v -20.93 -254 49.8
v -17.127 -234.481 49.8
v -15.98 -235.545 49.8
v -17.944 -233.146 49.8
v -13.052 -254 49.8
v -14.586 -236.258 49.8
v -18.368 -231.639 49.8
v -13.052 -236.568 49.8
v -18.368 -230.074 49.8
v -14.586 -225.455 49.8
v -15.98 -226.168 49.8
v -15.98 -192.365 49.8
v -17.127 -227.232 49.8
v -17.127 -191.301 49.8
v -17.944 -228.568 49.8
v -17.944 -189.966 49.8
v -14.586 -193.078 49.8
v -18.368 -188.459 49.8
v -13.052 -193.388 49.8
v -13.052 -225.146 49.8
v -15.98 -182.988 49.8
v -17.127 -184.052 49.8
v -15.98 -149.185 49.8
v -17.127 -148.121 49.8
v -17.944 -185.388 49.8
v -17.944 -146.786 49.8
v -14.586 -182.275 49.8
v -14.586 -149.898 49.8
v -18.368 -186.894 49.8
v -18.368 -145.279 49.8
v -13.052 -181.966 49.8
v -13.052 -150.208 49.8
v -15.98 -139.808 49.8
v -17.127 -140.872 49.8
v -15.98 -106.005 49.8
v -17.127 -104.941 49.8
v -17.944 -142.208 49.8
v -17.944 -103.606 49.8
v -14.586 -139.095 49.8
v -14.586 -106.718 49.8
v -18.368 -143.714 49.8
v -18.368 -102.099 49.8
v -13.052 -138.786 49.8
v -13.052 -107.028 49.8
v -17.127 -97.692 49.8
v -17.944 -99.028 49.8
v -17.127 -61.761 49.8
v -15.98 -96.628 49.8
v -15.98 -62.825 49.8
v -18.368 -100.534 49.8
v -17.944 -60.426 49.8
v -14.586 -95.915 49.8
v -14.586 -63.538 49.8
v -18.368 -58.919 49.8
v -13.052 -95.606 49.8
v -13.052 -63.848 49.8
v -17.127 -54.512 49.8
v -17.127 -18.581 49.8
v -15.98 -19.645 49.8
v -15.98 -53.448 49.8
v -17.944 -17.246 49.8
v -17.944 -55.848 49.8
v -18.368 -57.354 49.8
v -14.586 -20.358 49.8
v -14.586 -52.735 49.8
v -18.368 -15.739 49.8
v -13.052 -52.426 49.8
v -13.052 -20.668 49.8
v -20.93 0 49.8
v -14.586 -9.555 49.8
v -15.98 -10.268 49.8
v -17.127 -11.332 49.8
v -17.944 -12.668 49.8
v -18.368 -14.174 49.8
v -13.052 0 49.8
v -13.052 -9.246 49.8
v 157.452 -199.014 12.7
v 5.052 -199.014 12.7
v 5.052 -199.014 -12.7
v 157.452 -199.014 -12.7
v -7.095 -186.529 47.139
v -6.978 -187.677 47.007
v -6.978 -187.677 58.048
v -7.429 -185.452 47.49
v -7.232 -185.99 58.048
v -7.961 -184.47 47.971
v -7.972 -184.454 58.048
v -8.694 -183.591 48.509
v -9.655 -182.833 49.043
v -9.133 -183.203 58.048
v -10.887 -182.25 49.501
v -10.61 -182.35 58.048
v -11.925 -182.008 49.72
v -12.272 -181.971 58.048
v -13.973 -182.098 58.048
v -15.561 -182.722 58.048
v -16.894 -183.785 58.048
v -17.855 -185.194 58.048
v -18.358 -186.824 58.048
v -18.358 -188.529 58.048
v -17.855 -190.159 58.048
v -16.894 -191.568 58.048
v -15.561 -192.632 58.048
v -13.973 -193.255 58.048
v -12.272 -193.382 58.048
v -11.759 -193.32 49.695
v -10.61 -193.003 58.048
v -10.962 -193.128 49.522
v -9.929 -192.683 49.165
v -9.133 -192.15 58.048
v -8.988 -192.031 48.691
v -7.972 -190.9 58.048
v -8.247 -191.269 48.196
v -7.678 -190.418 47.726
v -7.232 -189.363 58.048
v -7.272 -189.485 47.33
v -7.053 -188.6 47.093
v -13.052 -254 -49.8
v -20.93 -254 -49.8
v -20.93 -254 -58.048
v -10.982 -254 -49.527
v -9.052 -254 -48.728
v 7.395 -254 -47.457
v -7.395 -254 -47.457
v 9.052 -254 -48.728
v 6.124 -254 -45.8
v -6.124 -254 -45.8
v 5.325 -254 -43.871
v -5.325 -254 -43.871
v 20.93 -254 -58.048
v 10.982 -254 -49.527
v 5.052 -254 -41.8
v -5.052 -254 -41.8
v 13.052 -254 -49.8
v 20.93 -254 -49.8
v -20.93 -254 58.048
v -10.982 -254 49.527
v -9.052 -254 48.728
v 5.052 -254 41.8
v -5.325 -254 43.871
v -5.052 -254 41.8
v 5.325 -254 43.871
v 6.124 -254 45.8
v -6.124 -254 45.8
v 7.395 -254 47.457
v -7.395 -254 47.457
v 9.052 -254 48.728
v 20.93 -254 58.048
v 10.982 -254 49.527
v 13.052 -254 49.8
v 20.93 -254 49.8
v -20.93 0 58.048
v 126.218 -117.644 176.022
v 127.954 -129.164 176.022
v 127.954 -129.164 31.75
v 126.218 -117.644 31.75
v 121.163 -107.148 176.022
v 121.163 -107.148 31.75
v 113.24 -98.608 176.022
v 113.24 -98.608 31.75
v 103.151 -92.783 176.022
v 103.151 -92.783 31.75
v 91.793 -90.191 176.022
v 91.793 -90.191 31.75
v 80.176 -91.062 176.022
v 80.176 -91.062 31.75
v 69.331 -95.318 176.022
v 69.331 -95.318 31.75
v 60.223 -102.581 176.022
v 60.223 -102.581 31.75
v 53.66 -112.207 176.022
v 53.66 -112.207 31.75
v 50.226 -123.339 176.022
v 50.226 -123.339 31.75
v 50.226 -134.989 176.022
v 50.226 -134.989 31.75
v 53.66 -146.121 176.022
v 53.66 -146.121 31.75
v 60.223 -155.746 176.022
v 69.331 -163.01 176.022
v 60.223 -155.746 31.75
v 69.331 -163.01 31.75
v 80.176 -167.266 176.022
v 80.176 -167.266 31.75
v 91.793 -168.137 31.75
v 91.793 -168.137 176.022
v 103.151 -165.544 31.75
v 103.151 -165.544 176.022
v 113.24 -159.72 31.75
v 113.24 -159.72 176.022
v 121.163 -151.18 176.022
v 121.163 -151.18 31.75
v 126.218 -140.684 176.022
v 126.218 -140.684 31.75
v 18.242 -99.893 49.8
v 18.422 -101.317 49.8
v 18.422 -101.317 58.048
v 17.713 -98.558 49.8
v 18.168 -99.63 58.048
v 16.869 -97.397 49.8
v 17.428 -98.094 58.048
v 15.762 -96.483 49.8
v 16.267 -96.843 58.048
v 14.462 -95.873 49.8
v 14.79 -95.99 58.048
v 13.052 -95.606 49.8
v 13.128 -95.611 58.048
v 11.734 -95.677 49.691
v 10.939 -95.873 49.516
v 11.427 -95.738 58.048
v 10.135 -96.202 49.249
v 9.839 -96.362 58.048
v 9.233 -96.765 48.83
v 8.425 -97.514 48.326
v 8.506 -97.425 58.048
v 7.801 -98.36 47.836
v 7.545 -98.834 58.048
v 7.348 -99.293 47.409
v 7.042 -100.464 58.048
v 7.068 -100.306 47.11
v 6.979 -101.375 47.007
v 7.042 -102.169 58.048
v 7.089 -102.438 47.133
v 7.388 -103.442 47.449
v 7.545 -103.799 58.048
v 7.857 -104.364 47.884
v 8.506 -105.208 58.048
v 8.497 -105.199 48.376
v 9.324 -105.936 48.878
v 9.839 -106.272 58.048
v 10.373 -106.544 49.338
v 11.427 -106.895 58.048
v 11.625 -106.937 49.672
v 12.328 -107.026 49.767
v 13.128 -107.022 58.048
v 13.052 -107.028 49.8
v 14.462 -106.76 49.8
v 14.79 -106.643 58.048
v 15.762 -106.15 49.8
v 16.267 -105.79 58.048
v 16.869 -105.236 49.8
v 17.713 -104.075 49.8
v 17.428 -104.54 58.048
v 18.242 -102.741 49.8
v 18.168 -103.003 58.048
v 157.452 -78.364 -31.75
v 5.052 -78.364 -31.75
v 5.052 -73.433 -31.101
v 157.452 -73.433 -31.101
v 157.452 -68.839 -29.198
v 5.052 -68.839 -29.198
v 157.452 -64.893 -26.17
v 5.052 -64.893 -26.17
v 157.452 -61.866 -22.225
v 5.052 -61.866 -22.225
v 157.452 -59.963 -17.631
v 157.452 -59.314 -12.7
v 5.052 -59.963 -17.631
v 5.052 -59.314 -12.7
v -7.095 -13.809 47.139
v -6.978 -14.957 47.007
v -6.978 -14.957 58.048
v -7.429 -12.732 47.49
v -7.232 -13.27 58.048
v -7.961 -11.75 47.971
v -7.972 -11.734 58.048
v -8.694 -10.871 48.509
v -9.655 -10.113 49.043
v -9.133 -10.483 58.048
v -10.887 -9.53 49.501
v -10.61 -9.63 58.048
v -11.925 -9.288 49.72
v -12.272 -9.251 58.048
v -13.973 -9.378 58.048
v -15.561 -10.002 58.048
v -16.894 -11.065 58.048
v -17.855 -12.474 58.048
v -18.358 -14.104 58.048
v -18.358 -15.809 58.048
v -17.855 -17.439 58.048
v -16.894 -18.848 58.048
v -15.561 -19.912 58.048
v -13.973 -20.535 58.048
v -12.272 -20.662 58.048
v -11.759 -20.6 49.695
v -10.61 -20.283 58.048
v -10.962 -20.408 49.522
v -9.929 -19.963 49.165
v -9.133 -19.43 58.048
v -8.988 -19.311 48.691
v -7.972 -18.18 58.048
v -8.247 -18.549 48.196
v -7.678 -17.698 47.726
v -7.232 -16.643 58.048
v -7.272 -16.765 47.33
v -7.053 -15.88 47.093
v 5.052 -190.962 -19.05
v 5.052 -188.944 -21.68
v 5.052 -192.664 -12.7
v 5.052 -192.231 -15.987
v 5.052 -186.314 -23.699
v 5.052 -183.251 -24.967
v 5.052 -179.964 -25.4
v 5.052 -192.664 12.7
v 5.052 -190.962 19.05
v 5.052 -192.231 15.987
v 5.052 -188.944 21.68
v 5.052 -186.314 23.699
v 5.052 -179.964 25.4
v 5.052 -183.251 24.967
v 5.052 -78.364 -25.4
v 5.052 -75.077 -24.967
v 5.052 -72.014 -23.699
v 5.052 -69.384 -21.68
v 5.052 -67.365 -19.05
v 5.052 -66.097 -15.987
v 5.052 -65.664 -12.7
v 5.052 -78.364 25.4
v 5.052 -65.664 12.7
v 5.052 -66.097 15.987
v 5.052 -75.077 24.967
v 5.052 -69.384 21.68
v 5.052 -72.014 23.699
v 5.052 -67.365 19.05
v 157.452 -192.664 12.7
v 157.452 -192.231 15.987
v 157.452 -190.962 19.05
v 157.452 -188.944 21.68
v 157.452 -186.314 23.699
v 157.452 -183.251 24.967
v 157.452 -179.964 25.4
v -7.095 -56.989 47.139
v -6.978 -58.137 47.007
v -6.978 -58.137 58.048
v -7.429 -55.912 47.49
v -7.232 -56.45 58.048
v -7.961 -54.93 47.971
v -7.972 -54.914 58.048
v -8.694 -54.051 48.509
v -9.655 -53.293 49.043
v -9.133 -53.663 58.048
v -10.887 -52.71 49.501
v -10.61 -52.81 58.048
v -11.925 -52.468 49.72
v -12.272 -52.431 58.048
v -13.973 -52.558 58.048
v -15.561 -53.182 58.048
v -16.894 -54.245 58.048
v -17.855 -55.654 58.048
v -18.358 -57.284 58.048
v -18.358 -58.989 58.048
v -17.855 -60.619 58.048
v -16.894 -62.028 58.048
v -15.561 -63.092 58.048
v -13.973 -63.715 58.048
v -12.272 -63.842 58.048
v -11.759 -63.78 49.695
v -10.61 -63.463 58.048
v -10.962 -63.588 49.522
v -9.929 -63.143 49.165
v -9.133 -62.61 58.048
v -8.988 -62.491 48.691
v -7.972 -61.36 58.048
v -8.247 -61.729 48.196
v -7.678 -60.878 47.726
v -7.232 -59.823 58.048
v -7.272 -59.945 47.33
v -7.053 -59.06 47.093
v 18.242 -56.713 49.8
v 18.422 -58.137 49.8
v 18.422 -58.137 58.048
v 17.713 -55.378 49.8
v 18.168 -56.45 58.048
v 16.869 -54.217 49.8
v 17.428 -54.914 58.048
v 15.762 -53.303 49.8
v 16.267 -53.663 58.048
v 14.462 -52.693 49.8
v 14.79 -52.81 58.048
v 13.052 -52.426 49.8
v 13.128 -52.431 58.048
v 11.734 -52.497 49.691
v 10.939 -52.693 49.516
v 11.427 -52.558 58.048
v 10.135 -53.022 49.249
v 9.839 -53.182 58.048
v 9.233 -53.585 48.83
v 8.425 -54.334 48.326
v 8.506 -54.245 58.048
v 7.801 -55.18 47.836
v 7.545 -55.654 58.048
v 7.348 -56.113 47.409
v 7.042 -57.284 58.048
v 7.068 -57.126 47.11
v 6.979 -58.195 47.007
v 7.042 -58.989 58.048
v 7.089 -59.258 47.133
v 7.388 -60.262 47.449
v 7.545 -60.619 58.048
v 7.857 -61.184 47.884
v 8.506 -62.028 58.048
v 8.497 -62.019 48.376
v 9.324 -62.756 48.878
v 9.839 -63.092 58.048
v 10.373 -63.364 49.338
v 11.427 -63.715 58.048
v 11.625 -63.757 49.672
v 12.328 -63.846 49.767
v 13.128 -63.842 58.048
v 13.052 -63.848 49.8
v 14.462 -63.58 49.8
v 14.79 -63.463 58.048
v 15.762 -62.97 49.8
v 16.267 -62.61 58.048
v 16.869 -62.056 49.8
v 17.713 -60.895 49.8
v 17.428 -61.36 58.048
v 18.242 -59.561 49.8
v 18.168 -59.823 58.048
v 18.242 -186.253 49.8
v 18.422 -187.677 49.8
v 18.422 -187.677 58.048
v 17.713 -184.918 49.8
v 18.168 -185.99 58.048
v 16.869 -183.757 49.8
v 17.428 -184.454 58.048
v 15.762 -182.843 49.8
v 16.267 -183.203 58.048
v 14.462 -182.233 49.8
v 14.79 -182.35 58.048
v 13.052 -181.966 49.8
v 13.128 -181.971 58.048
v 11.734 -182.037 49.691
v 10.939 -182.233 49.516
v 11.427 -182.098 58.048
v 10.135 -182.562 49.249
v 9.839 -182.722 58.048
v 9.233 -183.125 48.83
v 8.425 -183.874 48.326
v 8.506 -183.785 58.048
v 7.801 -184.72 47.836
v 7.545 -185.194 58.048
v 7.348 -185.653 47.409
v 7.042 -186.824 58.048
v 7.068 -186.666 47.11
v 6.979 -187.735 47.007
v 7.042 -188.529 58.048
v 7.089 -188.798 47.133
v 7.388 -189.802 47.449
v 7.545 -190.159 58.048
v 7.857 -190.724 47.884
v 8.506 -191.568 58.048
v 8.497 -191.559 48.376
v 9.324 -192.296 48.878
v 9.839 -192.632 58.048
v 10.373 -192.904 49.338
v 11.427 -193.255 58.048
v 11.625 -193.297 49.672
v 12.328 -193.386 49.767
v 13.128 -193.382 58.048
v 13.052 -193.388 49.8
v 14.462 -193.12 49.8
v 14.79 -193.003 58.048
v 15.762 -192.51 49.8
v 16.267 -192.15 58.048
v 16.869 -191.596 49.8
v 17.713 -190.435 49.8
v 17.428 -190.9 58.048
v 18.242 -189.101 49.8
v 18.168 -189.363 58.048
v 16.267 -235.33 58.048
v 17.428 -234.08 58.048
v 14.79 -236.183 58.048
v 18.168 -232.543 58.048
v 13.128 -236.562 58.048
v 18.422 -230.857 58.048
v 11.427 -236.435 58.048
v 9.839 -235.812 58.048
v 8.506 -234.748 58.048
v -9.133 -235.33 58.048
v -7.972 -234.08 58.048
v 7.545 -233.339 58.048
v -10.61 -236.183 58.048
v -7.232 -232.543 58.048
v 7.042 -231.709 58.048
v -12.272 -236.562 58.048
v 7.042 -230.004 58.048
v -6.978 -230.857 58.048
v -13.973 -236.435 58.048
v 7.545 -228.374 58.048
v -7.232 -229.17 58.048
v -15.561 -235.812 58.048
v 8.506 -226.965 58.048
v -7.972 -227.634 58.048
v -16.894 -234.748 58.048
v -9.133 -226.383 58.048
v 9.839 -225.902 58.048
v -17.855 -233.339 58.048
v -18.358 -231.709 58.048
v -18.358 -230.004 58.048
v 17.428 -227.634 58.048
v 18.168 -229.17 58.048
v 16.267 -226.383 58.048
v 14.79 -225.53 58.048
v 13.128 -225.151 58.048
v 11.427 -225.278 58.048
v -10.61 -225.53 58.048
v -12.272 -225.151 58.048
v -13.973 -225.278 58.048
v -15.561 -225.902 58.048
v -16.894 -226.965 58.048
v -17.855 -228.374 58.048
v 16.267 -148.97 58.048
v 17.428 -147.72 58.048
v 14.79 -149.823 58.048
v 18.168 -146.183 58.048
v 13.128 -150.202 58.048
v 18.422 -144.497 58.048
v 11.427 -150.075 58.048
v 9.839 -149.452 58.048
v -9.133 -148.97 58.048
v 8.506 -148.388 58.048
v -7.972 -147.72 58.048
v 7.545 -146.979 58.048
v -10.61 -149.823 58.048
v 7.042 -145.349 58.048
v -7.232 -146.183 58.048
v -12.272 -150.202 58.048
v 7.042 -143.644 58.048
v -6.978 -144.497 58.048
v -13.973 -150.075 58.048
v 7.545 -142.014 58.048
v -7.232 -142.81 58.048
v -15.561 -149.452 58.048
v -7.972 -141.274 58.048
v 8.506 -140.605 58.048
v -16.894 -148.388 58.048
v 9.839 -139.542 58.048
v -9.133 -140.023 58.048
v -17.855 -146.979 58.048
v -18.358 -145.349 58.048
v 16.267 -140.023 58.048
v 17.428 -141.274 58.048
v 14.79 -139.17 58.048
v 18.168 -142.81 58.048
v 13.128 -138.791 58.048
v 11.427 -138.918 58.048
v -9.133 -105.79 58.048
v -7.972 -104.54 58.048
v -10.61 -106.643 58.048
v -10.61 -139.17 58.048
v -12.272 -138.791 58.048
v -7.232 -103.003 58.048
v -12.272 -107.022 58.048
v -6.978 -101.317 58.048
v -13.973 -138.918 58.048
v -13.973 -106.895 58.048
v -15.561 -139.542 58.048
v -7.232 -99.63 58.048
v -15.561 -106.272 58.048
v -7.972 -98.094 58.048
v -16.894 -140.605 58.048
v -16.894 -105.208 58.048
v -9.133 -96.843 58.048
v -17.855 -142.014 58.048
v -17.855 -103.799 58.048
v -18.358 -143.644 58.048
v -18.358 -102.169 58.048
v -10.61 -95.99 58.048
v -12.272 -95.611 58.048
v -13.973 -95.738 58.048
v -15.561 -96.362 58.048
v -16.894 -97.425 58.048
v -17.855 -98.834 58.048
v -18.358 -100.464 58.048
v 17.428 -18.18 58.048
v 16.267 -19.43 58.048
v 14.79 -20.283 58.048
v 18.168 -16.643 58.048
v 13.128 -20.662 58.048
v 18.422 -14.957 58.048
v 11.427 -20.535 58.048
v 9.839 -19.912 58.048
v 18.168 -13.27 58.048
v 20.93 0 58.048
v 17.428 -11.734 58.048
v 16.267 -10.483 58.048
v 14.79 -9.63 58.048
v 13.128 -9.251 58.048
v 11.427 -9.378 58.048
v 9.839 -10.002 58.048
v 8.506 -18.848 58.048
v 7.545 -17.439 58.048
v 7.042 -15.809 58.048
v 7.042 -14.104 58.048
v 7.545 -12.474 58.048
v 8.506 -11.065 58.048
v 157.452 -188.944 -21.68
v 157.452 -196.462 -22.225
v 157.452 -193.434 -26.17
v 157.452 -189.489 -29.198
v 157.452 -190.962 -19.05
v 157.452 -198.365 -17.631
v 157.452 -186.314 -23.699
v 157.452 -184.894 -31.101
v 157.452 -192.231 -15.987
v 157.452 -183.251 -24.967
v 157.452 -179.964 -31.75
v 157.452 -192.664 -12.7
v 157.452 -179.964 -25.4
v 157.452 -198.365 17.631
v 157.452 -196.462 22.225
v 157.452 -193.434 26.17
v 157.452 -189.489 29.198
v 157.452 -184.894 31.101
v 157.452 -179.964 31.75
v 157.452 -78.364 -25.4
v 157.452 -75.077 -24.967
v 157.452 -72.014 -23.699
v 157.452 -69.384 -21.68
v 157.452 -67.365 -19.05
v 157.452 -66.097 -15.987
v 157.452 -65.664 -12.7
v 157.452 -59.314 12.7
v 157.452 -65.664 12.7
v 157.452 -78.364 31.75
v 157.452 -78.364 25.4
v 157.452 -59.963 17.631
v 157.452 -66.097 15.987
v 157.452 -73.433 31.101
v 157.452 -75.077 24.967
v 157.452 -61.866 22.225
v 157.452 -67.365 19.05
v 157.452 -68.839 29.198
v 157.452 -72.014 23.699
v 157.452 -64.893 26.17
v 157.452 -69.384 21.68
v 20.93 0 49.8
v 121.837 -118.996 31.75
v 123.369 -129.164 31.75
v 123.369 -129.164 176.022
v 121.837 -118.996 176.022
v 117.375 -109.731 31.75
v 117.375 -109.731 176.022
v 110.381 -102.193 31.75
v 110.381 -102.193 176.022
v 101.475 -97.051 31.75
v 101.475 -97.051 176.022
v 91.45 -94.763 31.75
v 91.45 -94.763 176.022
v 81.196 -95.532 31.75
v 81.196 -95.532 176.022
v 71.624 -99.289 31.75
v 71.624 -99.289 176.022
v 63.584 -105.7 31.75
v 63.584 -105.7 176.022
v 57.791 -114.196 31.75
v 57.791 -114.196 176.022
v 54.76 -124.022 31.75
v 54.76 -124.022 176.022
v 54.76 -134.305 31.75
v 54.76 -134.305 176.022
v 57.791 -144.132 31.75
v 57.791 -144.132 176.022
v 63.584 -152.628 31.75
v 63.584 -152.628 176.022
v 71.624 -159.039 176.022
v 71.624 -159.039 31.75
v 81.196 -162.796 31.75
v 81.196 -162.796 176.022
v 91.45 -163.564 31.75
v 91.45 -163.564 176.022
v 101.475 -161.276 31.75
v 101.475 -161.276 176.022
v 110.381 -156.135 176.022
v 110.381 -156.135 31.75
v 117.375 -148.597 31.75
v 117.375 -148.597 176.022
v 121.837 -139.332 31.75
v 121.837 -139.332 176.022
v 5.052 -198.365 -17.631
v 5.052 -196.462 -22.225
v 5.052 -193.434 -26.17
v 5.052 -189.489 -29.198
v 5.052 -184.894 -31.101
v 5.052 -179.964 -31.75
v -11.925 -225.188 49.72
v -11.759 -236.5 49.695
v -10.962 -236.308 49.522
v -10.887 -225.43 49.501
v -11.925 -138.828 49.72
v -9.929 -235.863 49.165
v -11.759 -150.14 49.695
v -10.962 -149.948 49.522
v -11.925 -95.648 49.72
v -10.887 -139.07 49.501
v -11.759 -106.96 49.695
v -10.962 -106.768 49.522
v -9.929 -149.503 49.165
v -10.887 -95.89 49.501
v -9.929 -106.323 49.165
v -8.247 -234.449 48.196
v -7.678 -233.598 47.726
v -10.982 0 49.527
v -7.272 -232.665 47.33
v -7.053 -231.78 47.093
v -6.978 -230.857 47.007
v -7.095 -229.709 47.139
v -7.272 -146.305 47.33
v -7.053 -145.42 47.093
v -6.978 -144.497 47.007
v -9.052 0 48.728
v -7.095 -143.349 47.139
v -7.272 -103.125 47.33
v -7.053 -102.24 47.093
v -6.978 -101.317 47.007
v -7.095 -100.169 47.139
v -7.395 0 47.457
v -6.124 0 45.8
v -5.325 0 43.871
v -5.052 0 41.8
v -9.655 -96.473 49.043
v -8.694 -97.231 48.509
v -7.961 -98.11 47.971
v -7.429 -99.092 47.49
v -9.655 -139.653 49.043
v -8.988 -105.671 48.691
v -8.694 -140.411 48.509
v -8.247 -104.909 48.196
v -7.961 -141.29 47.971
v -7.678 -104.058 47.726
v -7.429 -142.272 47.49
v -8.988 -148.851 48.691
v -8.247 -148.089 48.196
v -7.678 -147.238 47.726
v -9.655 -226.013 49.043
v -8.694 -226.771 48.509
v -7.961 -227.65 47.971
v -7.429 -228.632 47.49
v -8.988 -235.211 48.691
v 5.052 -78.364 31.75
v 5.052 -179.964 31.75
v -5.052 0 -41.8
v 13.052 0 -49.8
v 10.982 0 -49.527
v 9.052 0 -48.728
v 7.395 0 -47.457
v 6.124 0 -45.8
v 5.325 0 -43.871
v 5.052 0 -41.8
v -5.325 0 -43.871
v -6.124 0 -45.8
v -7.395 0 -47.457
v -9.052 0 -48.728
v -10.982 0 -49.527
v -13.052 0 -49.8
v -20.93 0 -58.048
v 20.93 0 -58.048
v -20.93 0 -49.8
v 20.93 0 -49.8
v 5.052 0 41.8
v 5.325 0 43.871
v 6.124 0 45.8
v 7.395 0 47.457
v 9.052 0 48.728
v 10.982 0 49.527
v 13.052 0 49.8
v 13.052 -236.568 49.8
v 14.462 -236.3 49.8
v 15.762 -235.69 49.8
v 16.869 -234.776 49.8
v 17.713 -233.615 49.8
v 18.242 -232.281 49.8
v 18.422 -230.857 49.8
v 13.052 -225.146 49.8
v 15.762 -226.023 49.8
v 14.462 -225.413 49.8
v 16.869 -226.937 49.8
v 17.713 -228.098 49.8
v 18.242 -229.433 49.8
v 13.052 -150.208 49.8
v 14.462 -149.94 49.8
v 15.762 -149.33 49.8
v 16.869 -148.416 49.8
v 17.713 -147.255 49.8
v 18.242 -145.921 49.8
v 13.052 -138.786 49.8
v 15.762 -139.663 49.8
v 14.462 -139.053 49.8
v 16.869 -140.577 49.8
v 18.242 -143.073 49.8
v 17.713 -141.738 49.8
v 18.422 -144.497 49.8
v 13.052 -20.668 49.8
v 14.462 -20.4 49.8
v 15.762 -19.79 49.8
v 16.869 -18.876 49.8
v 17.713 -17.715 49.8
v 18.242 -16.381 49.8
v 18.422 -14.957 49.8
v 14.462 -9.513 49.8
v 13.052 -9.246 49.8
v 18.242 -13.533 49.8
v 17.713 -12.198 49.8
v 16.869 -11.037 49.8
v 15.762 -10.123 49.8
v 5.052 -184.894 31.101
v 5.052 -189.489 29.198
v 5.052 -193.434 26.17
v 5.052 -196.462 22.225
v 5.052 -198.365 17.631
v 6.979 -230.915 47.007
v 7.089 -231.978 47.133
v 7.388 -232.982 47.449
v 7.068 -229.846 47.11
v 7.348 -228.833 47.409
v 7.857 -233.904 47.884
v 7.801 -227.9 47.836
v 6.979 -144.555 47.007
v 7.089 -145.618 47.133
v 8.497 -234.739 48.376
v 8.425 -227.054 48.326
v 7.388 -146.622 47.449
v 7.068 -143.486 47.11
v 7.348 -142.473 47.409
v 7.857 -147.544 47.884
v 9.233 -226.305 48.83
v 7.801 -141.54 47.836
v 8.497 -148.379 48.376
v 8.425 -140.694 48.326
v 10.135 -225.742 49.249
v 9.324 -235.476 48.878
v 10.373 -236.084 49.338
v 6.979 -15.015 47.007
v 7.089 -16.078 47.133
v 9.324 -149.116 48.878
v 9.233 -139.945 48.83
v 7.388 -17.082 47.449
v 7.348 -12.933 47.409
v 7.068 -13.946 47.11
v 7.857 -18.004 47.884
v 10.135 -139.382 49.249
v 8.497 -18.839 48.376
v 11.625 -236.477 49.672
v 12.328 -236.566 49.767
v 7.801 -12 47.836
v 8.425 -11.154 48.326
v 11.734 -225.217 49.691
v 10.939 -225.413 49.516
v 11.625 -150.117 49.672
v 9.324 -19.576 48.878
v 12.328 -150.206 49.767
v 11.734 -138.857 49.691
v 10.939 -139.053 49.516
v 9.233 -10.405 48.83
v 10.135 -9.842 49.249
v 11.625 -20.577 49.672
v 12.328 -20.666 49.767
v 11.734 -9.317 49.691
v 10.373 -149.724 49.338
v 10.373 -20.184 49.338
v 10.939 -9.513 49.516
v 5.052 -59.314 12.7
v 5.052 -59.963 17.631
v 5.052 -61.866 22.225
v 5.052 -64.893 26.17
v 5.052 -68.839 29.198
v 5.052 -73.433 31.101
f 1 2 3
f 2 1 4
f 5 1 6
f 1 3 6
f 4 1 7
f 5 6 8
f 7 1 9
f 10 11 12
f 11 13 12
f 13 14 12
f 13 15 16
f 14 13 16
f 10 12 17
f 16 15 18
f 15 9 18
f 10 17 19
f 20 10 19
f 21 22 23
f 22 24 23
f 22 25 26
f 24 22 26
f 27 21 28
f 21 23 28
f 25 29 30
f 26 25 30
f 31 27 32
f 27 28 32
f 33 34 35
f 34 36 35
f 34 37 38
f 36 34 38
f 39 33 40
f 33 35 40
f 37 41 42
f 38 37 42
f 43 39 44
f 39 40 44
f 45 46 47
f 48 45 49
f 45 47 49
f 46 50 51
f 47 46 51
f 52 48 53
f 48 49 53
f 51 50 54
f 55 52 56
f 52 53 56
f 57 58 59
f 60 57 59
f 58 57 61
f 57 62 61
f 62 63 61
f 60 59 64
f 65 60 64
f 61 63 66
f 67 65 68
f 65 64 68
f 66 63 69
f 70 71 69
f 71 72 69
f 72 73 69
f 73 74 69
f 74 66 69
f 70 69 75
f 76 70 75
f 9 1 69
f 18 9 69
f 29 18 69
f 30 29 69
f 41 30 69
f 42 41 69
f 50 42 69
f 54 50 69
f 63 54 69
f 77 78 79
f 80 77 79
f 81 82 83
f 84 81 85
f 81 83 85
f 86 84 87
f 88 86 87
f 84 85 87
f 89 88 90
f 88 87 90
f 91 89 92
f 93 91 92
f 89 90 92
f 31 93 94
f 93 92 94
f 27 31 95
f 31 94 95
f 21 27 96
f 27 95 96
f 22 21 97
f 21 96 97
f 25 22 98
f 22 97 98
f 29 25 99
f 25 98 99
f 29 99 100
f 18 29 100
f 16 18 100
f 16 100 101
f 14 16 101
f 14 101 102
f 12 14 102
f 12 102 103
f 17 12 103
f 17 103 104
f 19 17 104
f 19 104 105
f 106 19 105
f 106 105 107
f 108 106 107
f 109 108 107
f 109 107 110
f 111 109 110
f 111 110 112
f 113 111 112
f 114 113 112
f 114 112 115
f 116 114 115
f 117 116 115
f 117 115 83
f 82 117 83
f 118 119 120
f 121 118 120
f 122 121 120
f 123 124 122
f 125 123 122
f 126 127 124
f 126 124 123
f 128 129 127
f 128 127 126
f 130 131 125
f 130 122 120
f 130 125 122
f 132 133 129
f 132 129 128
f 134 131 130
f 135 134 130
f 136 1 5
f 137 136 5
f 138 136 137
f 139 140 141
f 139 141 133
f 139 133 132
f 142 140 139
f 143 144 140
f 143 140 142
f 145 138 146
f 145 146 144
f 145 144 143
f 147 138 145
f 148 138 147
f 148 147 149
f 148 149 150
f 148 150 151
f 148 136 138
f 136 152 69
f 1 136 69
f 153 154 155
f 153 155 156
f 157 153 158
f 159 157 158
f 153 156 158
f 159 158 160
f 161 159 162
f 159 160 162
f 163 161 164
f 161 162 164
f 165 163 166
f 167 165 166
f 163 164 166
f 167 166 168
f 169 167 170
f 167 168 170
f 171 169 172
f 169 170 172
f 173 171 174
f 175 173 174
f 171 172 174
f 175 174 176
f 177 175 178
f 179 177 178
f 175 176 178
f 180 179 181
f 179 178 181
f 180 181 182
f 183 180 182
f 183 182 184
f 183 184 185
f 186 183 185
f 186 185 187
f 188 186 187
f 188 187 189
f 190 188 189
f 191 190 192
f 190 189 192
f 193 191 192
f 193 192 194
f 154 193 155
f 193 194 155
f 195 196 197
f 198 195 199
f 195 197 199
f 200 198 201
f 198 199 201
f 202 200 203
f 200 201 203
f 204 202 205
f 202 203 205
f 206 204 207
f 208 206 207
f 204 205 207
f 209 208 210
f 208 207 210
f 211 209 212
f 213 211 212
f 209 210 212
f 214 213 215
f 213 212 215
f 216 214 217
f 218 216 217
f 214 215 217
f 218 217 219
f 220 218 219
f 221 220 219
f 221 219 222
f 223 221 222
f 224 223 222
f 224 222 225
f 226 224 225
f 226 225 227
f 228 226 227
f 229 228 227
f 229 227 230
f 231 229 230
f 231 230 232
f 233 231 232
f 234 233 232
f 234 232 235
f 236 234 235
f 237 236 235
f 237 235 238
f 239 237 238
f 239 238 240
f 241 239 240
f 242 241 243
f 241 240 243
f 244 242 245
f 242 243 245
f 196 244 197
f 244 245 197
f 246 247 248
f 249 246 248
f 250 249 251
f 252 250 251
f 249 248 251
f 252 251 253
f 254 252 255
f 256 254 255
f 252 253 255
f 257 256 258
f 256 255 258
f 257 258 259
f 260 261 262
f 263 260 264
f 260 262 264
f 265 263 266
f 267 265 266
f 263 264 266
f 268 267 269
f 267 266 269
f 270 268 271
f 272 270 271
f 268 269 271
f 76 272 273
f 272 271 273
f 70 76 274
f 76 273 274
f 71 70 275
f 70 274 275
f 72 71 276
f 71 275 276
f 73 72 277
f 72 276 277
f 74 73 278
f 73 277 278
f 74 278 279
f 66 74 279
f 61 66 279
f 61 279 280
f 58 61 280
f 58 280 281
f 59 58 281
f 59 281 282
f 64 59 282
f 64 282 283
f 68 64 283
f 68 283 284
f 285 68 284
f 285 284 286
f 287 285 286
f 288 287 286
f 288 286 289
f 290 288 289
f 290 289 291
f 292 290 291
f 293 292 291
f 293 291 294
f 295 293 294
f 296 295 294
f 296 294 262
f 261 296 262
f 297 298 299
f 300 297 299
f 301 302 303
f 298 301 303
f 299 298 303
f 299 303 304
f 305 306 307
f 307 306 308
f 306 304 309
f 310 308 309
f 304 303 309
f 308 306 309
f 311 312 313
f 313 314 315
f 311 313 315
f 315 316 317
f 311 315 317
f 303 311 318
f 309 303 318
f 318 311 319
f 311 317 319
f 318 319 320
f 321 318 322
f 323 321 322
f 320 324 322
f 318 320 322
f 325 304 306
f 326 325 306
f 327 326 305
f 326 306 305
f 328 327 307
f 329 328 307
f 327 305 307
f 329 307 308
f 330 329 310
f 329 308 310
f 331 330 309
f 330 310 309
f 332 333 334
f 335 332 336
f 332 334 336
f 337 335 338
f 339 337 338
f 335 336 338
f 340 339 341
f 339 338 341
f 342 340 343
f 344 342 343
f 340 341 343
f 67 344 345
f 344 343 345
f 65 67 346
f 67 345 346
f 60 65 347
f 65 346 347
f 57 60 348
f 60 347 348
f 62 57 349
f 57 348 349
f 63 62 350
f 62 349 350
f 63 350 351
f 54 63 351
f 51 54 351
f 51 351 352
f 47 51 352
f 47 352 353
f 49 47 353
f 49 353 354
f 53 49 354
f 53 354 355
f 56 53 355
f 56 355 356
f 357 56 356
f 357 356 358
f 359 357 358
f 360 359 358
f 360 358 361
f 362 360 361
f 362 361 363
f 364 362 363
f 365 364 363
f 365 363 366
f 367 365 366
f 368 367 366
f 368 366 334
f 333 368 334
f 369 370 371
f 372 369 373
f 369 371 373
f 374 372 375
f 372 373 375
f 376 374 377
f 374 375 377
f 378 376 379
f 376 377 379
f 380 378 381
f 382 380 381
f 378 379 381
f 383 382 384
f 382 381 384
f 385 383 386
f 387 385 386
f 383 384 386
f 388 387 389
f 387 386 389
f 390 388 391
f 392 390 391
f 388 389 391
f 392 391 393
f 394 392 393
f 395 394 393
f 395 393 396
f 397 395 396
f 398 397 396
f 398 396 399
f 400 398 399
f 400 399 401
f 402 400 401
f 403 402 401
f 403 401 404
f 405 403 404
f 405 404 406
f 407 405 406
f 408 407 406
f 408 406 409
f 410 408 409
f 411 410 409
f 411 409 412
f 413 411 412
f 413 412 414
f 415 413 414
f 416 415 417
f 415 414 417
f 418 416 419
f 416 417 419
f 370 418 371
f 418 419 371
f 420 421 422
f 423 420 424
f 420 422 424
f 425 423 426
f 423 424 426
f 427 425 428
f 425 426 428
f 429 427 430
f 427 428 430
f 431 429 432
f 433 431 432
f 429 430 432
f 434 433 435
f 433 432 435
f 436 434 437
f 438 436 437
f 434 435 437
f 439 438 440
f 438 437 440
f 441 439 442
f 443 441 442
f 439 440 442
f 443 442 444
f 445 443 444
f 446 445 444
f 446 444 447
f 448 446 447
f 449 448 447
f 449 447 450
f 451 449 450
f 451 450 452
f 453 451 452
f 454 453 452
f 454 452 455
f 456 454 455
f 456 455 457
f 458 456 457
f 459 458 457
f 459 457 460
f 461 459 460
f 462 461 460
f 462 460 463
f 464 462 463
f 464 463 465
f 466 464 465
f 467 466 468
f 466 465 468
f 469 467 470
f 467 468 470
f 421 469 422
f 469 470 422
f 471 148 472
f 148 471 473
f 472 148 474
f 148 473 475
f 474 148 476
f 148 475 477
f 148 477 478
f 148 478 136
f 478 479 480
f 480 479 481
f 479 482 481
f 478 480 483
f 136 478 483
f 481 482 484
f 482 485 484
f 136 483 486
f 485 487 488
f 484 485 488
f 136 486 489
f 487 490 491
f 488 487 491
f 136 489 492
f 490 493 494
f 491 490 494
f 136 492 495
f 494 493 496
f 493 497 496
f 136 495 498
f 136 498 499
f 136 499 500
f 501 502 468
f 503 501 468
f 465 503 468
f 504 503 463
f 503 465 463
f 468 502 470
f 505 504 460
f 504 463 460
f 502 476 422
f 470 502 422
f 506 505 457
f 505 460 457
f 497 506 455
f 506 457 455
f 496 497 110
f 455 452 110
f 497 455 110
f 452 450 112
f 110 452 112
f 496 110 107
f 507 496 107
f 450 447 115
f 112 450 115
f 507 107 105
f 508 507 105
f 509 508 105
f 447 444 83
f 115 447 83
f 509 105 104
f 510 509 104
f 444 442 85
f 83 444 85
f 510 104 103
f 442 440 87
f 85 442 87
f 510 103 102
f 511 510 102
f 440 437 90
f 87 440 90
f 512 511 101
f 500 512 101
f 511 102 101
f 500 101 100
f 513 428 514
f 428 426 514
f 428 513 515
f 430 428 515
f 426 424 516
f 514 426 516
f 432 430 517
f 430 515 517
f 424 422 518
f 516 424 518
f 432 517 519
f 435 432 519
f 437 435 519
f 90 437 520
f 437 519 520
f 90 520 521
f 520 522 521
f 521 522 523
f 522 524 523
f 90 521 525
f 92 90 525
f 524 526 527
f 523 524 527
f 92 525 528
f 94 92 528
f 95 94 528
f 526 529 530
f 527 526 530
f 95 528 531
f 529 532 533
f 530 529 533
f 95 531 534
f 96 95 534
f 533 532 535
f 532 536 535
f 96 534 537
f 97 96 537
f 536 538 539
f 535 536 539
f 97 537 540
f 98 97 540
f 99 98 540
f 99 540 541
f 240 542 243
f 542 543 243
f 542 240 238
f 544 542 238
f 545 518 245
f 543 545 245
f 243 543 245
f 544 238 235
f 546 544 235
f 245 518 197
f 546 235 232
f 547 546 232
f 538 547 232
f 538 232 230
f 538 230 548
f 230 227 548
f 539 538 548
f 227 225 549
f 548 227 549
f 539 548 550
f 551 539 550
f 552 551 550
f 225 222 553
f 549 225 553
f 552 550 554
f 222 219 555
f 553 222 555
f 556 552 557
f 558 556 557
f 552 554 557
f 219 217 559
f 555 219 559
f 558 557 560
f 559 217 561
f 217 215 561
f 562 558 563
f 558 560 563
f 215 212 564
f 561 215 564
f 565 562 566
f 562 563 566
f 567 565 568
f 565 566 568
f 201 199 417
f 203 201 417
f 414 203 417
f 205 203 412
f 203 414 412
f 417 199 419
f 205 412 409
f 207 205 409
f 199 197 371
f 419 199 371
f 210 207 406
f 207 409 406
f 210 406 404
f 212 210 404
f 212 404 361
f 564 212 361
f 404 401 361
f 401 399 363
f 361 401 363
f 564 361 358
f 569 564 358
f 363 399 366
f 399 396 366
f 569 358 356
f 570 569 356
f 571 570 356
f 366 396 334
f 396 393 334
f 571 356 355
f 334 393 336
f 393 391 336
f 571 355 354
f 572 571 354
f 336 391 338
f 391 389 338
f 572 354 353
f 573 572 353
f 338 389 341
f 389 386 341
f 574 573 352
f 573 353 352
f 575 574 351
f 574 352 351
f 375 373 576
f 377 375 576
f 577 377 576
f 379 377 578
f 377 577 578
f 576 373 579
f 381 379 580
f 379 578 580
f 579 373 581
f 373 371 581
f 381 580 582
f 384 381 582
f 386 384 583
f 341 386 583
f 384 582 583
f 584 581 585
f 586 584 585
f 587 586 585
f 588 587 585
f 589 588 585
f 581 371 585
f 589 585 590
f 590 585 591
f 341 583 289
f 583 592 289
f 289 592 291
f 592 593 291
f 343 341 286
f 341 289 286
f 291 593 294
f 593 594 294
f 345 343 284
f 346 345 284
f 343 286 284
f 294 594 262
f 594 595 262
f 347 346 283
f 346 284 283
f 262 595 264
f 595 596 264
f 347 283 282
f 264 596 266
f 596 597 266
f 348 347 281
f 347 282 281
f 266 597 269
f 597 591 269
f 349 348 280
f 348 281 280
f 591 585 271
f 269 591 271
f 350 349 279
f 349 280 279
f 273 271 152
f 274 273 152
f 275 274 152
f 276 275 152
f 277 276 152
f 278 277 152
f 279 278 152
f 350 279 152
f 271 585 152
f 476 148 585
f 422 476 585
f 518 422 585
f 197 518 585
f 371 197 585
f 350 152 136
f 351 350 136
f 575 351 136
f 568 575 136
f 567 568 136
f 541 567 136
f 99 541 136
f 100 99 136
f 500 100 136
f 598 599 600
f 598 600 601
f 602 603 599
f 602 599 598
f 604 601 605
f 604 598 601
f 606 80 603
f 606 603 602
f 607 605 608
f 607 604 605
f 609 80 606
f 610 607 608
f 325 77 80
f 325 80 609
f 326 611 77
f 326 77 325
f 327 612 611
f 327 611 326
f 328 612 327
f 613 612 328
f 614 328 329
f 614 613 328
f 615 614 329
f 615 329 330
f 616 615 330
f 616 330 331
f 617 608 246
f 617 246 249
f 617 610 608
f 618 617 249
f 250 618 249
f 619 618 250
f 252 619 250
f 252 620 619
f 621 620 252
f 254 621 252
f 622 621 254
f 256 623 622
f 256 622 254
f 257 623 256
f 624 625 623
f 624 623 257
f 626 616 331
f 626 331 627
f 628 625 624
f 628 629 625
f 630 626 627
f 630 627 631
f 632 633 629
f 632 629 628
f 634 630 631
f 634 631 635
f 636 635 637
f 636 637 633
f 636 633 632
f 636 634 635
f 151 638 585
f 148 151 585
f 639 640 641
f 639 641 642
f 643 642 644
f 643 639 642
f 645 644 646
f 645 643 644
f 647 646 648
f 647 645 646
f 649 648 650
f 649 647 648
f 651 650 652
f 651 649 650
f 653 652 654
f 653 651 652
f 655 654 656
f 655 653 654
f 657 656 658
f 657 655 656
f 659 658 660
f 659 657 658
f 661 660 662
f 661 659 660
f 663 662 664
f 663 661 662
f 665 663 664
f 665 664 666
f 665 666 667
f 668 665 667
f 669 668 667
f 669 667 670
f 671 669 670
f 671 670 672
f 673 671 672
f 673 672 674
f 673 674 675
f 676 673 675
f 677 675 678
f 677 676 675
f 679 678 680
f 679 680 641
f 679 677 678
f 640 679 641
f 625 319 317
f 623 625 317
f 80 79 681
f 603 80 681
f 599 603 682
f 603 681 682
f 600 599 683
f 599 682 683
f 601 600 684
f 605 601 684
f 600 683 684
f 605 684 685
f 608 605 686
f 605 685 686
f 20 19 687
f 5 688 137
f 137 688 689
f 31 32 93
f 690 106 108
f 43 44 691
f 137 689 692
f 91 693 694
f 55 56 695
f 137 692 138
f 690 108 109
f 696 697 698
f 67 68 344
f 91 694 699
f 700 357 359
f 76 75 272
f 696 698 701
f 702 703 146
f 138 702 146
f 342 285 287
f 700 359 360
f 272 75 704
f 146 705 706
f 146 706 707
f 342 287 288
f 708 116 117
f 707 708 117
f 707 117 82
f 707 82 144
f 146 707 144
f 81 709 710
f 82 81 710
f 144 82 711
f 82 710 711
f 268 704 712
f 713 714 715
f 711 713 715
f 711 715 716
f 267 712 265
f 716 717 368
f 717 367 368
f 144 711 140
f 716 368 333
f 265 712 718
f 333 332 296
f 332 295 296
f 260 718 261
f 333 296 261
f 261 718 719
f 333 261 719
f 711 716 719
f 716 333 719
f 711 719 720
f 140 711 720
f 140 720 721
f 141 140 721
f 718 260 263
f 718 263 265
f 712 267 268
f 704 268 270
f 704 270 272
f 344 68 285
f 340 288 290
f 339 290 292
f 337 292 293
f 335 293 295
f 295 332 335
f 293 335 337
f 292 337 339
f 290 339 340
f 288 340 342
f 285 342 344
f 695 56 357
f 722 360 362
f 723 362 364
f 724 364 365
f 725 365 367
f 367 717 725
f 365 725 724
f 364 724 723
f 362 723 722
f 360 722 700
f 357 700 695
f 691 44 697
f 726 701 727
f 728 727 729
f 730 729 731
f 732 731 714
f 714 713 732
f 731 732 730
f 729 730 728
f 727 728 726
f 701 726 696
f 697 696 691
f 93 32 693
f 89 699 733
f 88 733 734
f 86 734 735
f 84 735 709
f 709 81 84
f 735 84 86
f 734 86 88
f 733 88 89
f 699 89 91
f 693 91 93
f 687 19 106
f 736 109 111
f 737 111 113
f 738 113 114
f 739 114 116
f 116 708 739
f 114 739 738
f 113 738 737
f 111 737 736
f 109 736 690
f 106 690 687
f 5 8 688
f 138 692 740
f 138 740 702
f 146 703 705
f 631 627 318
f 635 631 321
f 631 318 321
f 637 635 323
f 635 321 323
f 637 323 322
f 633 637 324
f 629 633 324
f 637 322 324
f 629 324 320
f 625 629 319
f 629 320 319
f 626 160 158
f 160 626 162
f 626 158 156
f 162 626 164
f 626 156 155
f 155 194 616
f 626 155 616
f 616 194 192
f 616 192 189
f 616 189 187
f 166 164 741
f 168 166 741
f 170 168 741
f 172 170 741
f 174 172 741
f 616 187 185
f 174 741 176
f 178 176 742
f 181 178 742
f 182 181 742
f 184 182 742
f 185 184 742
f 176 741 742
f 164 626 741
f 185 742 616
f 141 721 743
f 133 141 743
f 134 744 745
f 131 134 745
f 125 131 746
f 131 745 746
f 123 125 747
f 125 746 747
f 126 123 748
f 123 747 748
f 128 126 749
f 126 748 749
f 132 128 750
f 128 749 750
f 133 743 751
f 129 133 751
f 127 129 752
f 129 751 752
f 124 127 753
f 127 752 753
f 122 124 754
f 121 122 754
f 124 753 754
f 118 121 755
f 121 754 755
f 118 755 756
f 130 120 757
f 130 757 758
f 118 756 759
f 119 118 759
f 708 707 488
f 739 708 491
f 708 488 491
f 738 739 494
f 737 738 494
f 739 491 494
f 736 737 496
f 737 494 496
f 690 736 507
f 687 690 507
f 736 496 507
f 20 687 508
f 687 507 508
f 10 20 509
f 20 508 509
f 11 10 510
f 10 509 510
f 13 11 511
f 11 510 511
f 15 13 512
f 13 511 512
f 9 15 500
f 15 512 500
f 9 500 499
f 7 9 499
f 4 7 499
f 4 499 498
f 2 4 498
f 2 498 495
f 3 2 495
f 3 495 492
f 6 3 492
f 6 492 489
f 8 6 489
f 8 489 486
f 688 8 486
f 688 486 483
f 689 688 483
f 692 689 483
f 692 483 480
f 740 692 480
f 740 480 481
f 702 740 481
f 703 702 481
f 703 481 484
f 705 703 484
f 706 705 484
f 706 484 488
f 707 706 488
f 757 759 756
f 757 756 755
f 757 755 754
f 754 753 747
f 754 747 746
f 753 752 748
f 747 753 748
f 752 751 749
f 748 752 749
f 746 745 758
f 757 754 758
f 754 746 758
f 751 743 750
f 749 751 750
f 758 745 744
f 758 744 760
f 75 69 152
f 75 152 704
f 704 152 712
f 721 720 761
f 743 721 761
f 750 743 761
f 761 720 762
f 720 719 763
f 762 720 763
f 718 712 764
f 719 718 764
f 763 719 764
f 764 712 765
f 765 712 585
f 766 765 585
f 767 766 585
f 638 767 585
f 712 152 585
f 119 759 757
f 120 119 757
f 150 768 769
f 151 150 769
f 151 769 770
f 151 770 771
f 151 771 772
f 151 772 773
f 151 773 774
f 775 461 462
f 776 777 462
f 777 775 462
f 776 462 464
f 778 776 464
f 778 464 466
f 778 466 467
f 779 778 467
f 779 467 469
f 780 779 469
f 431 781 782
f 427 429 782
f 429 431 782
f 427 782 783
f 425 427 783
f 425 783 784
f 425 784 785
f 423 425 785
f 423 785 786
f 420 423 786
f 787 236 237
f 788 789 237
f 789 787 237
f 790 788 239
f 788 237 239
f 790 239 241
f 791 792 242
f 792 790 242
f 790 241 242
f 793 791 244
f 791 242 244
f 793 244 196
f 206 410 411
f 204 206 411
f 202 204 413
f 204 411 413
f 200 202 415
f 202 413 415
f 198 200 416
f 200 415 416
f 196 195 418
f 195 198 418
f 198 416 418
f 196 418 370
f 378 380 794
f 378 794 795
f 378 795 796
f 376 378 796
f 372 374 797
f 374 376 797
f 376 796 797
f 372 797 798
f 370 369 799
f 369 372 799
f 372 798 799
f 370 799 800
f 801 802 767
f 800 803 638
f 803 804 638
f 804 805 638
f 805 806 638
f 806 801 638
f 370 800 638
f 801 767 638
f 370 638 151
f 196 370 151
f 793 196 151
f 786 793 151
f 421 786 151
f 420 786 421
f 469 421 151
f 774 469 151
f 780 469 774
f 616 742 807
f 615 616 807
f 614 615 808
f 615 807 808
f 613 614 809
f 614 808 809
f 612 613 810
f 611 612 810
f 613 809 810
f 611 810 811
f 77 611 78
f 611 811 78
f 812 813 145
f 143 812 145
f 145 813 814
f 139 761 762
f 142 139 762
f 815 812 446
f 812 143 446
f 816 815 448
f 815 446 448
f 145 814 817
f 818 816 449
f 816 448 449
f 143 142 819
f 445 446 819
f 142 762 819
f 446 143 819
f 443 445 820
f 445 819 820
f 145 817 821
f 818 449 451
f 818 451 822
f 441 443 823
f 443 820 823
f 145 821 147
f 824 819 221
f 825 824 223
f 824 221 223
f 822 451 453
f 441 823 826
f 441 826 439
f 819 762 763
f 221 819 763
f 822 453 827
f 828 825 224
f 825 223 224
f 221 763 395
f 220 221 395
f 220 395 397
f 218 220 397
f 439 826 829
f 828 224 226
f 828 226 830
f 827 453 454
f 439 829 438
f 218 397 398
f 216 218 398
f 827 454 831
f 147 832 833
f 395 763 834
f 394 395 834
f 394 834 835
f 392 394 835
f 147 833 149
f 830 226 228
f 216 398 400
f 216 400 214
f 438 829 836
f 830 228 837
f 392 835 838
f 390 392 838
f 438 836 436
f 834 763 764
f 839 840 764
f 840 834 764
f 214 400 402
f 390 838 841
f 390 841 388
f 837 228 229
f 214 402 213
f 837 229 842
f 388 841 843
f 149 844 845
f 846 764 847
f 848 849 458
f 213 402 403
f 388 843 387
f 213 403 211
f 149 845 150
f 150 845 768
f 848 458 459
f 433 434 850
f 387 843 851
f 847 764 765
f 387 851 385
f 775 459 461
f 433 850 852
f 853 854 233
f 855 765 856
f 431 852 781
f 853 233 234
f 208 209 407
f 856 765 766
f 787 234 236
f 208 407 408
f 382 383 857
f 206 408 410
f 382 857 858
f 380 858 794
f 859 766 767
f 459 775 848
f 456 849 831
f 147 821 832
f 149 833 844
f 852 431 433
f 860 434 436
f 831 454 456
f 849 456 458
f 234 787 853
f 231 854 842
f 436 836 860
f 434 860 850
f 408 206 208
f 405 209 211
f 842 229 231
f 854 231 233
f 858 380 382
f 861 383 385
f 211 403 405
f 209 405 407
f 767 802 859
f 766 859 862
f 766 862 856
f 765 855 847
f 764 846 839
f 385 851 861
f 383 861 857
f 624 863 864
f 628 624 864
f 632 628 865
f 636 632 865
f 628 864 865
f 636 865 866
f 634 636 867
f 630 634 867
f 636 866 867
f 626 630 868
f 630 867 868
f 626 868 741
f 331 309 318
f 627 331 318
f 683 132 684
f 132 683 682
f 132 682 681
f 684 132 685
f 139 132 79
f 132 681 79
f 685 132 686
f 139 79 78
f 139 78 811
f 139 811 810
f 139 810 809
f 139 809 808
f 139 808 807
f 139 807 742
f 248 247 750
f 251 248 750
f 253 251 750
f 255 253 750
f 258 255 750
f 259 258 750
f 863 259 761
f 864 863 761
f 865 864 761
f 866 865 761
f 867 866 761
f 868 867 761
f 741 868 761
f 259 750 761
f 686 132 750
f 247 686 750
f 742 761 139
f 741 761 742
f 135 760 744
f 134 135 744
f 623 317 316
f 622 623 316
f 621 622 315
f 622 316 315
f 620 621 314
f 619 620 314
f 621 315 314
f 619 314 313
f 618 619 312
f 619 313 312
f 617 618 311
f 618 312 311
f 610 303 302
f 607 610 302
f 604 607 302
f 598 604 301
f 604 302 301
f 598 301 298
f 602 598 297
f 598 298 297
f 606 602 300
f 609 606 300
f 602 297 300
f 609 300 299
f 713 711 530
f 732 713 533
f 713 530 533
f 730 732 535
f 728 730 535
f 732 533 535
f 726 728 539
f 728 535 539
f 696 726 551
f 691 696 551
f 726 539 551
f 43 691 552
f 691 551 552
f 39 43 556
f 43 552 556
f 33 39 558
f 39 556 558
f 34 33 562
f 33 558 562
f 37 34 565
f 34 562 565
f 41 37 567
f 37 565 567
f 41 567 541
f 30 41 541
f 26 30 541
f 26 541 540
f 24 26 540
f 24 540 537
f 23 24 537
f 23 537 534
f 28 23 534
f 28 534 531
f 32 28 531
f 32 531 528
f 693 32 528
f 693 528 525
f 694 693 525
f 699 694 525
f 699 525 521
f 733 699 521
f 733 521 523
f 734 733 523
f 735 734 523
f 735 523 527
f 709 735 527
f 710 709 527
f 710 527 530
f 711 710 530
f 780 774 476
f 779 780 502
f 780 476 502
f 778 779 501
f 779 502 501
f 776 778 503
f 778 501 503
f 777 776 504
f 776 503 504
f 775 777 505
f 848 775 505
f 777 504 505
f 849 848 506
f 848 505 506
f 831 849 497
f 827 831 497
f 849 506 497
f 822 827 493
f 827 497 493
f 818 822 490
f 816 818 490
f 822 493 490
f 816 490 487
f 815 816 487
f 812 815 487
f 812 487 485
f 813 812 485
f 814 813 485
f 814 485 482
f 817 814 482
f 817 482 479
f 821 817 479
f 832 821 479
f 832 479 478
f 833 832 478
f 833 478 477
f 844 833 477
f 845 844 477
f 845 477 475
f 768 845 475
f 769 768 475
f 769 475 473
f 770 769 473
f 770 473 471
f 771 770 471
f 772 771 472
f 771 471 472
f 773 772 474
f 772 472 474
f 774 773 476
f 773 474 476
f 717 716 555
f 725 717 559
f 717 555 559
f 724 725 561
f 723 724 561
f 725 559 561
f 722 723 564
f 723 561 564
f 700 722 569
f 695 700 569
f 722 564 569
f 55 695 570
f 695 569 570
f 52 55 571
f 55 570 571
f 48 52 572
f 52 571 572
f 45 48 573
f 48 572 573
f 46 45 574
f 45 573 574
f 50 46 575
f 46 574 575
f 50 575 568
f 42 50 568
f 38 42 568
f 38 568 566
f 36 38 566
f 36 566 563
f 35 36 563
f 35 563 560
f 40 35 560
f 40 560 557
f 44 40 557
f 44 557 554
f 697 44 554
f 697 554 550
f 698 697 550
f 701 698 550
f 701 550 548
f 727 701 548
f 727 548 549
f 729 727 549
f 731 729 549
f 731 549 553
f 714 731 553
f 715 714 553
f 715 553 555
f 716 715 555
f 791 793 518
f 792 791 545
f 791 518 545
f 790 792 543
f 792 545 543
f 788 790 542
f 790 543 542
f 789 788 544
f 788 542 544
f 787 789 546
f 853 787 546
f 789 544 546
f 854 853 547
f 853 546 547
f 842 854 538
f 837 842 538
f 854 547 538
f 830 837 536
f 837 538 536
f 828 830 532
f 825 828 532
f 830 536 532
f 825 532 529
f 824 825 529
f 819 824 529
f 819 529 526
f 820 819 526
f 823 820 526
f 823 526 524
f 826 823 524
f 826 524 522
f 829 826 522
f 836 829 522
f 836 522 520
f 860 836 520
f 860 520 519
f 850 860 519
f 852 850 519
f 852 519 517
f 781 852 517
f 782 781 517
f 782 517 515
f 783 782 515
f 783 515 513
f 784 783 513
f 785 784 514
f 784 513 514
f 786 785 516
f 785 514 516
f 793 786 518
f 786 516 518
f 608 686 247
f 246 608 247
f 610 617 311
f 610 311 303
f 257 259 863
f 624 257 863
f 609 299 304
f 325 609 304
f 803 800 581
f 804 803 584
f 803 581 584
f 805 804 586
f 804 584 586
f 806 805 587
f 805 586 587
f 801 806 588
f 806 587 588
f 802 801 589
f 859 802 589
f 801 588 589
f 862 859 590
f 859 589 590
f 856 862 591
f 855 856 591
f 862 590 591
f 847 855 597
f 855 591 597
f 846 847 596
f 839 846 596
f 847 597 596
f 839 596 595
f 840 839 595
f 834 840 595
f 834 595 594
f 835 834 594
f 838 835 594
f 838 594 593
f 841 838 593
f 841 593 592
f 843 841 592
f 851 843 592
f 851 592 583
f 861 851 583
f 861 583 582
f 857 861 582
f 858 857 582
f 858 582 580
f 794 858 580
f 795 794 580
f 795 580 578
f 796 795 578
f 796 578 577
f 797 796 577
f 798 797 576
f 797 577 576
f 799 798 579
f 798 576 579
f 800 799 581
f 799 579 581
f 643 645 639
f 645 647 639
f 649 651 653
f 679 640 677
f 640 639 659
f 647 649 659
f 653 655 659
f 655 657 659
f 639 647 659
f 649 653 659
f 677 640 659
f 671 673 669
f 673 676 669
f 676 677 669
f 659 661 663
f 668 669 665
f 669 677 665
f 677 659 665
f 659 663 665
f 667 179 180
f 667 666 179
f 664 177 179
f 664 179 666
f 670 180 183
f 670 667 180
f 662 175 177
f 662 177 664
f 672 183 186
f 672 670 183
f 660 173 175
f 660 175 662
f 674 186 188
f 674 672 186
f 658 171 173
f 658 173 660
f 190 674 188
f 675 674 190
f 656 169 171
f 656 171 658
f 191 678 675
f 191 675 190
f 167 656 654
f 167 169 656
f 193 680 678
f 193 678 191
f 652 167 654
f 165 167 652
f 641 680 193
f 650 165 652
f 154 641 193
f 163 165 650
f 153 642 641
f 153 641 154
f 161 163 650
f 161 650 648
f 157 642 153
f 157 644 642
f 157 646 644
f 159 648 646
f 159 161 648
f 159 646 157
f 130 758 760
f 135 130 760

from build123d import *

# Parameters (mm, degrees)
F1_DEPTH = 254
F2_R     = 5.72172
F3_DEPTH = 25.4
F5_DEPTH = 152.4
F6_R     = 39.082199
F6_R_2   = 34.497025
F7_DEPTH = 144.272


with BuildPart() as f1:
    # F0 (on Front) → F1 (new body)
    with BuildSketch(Plane.XZ):
        with BuildLine():
            Line((-5.052177, -58.048494), (5.052177, -58.048494))
            Line((5.052177, -58.048494), (20.930452, -58.048494))
            Line((20.930452, -58.048494), (20.930452, -49.800038))
            Line((20.930452, -49.800038), (13.052177, -49.800038))
            ThreePointArc((13.052177, -49.800038), (7.395323, -47.456893), (5.052177, -41.800038))
            Line((5.052177, -41.800038), (5.052177, 41.800038))
            ThreePointArc((5.052177, 41.800038), (7.395323, 47.456893), (13.052177, 49.800038))
            Line((13.052177, 49.800038), (20.930452, 49.800038))
            Line((20.930452, 49.800038), (20.930452, 58.048494))
            Line((20.930452, 58.048494), (5.052177, 58.048494))
            Line((5.052177, 58.048494), (-5.052177, 58.048494))
            Line((-5.052177, 58.048494), (-20.930452, 58.048494))
            Line((-20.930452, 58.048494), (-20.930452, 49.800038))
            Line((-20.930452, 49.800038), (-13.052177, 49.800038))
            ThreePointArc((-13.052177, 49.800038), (-7.395323, 47.456893), (-5.052177, 41.800038))
            Line((-5.052177, 41.800038), (-5.052177, -41.800038))
            ThreePointArc((-5.052177, -41.800038), (-7.395323, -47.456893), (-13.052177, -49.800038))
            Line((-13.052177, -49.800038), (-20.930452, -49.800038))
            Line((-20.930452, -49.800038), (-20.930452, -58.048494))
            Line((-20.930452, -58.048494), (-5.052177, -58.048494))
        make_face()
    extrude(amount=F1_DEPTH)

    # F2 (on face) → F3 (cut)
    with BuildSketch(Plane.XY.offset(58.048494)):
        with Locations((12.7, -14.956662)):
            Circle(F2_R)
        with Locations((12.7, -58.136662)):
            Circle(F2_R)
        with Locations((12.7, -101.316662)):
            Circle(F2_R)
        with Locations((12.7, -144.496662)):
            Circle(F2_R)
        with Locations((12.7, -187.676662)):
            Circle(F2_R)
        with Locations((12.7, -230.856662)):
            Circle(F2_R)
        with Locations((-12.7, -230.856662)):
            Circle(F2_R)
        with Locations((-12.7, -187.676662)):
            Circle(F2_R)
        with Locations((-12.7, -144.496662)):
            Circle(F2_R)
        with Locations((-12.7, -101.316662)):
            Circle(F2_R)
        with Locations((-12.7, -58.136662)):
            Circle(F2_R)
        with Locations((-12.7, -14.956662)):
            Circle(F2_R)
    extrude(amount=-F3_DEPTH, mode=Mode.SUBTRACT)

    # F4 (on face) → F5 (join)
    with BuildSketch(Plane.YZ.offset(5.052177)):
        with BuildLine():
            Line((-59.313846, -12.7), (-59.313846, 12.7))
            ThreePointArc((-59.313846, 12.7), (-64.893462, 26.170384), (-78.363846, 31.75))
            Line((-78.363846, 31.75), (-179.963846, 31.75))
            ThreePointArc((-179.963846, 31.75), (-193.434231, 26.170384), (-199.013846, 12.7))
            Line((-199.013846, 12.7), (-199.013846, -12.7))
            ThreePointArc((-199.013846, -12.7), (-193.434231, -26.170384), (-179.963846, -31.75))
            Line((-179.963846, -31.75), (-78.363846, -31.75))
            ThreePointArc((-78.363846, -31.75), (-64.893462, -26.170384), (-59.313846, -12.7))
        make_face()
        with BuildLine():
            ThreePointArc((-65.663846, -12.7), (-69.38359, -21.680256), (-78.363846, -25.4))
            Line((-78.363846, -25.4), (-179.963846, -25.4))
            ThreePointArc((-179.963846, -25.4), (-188.944102, -21.680256), (-192.663846, -12.7))
            Line((-192.663846, -12.7), (-192.663846, 12.7))
            ThreePointArc((-192.663846, 12.7), (-188.944102, 21.680256), (-179.963846, 25.4))
            Line((-179.963846, 25.4), (-78.363846, 25.4))
            ThreePointArc((-78.363846, 25.4), (-69.38359, 21.680256), (-65.663846, 12.7))
            Line((-65.663846, 12.7), (-65.663846, -12.7))
        make_face(mode=Mode.SUBTRACT)
    extrude(amount=F5_DEPTH)

    # F6 (on face) → F7 (join)
    with BuildSketch(Plane.XY.offset(31.75)):
        with Locations((88.872177, -129.163846)):
            Circle(F6_R)
        with Locations((88.872177, -129.163846)):
            Circle(F6_R_2, mode=Mode.SUBTRACT)
    extrude(amount=F7_DEPTH)


solid = f1.part
